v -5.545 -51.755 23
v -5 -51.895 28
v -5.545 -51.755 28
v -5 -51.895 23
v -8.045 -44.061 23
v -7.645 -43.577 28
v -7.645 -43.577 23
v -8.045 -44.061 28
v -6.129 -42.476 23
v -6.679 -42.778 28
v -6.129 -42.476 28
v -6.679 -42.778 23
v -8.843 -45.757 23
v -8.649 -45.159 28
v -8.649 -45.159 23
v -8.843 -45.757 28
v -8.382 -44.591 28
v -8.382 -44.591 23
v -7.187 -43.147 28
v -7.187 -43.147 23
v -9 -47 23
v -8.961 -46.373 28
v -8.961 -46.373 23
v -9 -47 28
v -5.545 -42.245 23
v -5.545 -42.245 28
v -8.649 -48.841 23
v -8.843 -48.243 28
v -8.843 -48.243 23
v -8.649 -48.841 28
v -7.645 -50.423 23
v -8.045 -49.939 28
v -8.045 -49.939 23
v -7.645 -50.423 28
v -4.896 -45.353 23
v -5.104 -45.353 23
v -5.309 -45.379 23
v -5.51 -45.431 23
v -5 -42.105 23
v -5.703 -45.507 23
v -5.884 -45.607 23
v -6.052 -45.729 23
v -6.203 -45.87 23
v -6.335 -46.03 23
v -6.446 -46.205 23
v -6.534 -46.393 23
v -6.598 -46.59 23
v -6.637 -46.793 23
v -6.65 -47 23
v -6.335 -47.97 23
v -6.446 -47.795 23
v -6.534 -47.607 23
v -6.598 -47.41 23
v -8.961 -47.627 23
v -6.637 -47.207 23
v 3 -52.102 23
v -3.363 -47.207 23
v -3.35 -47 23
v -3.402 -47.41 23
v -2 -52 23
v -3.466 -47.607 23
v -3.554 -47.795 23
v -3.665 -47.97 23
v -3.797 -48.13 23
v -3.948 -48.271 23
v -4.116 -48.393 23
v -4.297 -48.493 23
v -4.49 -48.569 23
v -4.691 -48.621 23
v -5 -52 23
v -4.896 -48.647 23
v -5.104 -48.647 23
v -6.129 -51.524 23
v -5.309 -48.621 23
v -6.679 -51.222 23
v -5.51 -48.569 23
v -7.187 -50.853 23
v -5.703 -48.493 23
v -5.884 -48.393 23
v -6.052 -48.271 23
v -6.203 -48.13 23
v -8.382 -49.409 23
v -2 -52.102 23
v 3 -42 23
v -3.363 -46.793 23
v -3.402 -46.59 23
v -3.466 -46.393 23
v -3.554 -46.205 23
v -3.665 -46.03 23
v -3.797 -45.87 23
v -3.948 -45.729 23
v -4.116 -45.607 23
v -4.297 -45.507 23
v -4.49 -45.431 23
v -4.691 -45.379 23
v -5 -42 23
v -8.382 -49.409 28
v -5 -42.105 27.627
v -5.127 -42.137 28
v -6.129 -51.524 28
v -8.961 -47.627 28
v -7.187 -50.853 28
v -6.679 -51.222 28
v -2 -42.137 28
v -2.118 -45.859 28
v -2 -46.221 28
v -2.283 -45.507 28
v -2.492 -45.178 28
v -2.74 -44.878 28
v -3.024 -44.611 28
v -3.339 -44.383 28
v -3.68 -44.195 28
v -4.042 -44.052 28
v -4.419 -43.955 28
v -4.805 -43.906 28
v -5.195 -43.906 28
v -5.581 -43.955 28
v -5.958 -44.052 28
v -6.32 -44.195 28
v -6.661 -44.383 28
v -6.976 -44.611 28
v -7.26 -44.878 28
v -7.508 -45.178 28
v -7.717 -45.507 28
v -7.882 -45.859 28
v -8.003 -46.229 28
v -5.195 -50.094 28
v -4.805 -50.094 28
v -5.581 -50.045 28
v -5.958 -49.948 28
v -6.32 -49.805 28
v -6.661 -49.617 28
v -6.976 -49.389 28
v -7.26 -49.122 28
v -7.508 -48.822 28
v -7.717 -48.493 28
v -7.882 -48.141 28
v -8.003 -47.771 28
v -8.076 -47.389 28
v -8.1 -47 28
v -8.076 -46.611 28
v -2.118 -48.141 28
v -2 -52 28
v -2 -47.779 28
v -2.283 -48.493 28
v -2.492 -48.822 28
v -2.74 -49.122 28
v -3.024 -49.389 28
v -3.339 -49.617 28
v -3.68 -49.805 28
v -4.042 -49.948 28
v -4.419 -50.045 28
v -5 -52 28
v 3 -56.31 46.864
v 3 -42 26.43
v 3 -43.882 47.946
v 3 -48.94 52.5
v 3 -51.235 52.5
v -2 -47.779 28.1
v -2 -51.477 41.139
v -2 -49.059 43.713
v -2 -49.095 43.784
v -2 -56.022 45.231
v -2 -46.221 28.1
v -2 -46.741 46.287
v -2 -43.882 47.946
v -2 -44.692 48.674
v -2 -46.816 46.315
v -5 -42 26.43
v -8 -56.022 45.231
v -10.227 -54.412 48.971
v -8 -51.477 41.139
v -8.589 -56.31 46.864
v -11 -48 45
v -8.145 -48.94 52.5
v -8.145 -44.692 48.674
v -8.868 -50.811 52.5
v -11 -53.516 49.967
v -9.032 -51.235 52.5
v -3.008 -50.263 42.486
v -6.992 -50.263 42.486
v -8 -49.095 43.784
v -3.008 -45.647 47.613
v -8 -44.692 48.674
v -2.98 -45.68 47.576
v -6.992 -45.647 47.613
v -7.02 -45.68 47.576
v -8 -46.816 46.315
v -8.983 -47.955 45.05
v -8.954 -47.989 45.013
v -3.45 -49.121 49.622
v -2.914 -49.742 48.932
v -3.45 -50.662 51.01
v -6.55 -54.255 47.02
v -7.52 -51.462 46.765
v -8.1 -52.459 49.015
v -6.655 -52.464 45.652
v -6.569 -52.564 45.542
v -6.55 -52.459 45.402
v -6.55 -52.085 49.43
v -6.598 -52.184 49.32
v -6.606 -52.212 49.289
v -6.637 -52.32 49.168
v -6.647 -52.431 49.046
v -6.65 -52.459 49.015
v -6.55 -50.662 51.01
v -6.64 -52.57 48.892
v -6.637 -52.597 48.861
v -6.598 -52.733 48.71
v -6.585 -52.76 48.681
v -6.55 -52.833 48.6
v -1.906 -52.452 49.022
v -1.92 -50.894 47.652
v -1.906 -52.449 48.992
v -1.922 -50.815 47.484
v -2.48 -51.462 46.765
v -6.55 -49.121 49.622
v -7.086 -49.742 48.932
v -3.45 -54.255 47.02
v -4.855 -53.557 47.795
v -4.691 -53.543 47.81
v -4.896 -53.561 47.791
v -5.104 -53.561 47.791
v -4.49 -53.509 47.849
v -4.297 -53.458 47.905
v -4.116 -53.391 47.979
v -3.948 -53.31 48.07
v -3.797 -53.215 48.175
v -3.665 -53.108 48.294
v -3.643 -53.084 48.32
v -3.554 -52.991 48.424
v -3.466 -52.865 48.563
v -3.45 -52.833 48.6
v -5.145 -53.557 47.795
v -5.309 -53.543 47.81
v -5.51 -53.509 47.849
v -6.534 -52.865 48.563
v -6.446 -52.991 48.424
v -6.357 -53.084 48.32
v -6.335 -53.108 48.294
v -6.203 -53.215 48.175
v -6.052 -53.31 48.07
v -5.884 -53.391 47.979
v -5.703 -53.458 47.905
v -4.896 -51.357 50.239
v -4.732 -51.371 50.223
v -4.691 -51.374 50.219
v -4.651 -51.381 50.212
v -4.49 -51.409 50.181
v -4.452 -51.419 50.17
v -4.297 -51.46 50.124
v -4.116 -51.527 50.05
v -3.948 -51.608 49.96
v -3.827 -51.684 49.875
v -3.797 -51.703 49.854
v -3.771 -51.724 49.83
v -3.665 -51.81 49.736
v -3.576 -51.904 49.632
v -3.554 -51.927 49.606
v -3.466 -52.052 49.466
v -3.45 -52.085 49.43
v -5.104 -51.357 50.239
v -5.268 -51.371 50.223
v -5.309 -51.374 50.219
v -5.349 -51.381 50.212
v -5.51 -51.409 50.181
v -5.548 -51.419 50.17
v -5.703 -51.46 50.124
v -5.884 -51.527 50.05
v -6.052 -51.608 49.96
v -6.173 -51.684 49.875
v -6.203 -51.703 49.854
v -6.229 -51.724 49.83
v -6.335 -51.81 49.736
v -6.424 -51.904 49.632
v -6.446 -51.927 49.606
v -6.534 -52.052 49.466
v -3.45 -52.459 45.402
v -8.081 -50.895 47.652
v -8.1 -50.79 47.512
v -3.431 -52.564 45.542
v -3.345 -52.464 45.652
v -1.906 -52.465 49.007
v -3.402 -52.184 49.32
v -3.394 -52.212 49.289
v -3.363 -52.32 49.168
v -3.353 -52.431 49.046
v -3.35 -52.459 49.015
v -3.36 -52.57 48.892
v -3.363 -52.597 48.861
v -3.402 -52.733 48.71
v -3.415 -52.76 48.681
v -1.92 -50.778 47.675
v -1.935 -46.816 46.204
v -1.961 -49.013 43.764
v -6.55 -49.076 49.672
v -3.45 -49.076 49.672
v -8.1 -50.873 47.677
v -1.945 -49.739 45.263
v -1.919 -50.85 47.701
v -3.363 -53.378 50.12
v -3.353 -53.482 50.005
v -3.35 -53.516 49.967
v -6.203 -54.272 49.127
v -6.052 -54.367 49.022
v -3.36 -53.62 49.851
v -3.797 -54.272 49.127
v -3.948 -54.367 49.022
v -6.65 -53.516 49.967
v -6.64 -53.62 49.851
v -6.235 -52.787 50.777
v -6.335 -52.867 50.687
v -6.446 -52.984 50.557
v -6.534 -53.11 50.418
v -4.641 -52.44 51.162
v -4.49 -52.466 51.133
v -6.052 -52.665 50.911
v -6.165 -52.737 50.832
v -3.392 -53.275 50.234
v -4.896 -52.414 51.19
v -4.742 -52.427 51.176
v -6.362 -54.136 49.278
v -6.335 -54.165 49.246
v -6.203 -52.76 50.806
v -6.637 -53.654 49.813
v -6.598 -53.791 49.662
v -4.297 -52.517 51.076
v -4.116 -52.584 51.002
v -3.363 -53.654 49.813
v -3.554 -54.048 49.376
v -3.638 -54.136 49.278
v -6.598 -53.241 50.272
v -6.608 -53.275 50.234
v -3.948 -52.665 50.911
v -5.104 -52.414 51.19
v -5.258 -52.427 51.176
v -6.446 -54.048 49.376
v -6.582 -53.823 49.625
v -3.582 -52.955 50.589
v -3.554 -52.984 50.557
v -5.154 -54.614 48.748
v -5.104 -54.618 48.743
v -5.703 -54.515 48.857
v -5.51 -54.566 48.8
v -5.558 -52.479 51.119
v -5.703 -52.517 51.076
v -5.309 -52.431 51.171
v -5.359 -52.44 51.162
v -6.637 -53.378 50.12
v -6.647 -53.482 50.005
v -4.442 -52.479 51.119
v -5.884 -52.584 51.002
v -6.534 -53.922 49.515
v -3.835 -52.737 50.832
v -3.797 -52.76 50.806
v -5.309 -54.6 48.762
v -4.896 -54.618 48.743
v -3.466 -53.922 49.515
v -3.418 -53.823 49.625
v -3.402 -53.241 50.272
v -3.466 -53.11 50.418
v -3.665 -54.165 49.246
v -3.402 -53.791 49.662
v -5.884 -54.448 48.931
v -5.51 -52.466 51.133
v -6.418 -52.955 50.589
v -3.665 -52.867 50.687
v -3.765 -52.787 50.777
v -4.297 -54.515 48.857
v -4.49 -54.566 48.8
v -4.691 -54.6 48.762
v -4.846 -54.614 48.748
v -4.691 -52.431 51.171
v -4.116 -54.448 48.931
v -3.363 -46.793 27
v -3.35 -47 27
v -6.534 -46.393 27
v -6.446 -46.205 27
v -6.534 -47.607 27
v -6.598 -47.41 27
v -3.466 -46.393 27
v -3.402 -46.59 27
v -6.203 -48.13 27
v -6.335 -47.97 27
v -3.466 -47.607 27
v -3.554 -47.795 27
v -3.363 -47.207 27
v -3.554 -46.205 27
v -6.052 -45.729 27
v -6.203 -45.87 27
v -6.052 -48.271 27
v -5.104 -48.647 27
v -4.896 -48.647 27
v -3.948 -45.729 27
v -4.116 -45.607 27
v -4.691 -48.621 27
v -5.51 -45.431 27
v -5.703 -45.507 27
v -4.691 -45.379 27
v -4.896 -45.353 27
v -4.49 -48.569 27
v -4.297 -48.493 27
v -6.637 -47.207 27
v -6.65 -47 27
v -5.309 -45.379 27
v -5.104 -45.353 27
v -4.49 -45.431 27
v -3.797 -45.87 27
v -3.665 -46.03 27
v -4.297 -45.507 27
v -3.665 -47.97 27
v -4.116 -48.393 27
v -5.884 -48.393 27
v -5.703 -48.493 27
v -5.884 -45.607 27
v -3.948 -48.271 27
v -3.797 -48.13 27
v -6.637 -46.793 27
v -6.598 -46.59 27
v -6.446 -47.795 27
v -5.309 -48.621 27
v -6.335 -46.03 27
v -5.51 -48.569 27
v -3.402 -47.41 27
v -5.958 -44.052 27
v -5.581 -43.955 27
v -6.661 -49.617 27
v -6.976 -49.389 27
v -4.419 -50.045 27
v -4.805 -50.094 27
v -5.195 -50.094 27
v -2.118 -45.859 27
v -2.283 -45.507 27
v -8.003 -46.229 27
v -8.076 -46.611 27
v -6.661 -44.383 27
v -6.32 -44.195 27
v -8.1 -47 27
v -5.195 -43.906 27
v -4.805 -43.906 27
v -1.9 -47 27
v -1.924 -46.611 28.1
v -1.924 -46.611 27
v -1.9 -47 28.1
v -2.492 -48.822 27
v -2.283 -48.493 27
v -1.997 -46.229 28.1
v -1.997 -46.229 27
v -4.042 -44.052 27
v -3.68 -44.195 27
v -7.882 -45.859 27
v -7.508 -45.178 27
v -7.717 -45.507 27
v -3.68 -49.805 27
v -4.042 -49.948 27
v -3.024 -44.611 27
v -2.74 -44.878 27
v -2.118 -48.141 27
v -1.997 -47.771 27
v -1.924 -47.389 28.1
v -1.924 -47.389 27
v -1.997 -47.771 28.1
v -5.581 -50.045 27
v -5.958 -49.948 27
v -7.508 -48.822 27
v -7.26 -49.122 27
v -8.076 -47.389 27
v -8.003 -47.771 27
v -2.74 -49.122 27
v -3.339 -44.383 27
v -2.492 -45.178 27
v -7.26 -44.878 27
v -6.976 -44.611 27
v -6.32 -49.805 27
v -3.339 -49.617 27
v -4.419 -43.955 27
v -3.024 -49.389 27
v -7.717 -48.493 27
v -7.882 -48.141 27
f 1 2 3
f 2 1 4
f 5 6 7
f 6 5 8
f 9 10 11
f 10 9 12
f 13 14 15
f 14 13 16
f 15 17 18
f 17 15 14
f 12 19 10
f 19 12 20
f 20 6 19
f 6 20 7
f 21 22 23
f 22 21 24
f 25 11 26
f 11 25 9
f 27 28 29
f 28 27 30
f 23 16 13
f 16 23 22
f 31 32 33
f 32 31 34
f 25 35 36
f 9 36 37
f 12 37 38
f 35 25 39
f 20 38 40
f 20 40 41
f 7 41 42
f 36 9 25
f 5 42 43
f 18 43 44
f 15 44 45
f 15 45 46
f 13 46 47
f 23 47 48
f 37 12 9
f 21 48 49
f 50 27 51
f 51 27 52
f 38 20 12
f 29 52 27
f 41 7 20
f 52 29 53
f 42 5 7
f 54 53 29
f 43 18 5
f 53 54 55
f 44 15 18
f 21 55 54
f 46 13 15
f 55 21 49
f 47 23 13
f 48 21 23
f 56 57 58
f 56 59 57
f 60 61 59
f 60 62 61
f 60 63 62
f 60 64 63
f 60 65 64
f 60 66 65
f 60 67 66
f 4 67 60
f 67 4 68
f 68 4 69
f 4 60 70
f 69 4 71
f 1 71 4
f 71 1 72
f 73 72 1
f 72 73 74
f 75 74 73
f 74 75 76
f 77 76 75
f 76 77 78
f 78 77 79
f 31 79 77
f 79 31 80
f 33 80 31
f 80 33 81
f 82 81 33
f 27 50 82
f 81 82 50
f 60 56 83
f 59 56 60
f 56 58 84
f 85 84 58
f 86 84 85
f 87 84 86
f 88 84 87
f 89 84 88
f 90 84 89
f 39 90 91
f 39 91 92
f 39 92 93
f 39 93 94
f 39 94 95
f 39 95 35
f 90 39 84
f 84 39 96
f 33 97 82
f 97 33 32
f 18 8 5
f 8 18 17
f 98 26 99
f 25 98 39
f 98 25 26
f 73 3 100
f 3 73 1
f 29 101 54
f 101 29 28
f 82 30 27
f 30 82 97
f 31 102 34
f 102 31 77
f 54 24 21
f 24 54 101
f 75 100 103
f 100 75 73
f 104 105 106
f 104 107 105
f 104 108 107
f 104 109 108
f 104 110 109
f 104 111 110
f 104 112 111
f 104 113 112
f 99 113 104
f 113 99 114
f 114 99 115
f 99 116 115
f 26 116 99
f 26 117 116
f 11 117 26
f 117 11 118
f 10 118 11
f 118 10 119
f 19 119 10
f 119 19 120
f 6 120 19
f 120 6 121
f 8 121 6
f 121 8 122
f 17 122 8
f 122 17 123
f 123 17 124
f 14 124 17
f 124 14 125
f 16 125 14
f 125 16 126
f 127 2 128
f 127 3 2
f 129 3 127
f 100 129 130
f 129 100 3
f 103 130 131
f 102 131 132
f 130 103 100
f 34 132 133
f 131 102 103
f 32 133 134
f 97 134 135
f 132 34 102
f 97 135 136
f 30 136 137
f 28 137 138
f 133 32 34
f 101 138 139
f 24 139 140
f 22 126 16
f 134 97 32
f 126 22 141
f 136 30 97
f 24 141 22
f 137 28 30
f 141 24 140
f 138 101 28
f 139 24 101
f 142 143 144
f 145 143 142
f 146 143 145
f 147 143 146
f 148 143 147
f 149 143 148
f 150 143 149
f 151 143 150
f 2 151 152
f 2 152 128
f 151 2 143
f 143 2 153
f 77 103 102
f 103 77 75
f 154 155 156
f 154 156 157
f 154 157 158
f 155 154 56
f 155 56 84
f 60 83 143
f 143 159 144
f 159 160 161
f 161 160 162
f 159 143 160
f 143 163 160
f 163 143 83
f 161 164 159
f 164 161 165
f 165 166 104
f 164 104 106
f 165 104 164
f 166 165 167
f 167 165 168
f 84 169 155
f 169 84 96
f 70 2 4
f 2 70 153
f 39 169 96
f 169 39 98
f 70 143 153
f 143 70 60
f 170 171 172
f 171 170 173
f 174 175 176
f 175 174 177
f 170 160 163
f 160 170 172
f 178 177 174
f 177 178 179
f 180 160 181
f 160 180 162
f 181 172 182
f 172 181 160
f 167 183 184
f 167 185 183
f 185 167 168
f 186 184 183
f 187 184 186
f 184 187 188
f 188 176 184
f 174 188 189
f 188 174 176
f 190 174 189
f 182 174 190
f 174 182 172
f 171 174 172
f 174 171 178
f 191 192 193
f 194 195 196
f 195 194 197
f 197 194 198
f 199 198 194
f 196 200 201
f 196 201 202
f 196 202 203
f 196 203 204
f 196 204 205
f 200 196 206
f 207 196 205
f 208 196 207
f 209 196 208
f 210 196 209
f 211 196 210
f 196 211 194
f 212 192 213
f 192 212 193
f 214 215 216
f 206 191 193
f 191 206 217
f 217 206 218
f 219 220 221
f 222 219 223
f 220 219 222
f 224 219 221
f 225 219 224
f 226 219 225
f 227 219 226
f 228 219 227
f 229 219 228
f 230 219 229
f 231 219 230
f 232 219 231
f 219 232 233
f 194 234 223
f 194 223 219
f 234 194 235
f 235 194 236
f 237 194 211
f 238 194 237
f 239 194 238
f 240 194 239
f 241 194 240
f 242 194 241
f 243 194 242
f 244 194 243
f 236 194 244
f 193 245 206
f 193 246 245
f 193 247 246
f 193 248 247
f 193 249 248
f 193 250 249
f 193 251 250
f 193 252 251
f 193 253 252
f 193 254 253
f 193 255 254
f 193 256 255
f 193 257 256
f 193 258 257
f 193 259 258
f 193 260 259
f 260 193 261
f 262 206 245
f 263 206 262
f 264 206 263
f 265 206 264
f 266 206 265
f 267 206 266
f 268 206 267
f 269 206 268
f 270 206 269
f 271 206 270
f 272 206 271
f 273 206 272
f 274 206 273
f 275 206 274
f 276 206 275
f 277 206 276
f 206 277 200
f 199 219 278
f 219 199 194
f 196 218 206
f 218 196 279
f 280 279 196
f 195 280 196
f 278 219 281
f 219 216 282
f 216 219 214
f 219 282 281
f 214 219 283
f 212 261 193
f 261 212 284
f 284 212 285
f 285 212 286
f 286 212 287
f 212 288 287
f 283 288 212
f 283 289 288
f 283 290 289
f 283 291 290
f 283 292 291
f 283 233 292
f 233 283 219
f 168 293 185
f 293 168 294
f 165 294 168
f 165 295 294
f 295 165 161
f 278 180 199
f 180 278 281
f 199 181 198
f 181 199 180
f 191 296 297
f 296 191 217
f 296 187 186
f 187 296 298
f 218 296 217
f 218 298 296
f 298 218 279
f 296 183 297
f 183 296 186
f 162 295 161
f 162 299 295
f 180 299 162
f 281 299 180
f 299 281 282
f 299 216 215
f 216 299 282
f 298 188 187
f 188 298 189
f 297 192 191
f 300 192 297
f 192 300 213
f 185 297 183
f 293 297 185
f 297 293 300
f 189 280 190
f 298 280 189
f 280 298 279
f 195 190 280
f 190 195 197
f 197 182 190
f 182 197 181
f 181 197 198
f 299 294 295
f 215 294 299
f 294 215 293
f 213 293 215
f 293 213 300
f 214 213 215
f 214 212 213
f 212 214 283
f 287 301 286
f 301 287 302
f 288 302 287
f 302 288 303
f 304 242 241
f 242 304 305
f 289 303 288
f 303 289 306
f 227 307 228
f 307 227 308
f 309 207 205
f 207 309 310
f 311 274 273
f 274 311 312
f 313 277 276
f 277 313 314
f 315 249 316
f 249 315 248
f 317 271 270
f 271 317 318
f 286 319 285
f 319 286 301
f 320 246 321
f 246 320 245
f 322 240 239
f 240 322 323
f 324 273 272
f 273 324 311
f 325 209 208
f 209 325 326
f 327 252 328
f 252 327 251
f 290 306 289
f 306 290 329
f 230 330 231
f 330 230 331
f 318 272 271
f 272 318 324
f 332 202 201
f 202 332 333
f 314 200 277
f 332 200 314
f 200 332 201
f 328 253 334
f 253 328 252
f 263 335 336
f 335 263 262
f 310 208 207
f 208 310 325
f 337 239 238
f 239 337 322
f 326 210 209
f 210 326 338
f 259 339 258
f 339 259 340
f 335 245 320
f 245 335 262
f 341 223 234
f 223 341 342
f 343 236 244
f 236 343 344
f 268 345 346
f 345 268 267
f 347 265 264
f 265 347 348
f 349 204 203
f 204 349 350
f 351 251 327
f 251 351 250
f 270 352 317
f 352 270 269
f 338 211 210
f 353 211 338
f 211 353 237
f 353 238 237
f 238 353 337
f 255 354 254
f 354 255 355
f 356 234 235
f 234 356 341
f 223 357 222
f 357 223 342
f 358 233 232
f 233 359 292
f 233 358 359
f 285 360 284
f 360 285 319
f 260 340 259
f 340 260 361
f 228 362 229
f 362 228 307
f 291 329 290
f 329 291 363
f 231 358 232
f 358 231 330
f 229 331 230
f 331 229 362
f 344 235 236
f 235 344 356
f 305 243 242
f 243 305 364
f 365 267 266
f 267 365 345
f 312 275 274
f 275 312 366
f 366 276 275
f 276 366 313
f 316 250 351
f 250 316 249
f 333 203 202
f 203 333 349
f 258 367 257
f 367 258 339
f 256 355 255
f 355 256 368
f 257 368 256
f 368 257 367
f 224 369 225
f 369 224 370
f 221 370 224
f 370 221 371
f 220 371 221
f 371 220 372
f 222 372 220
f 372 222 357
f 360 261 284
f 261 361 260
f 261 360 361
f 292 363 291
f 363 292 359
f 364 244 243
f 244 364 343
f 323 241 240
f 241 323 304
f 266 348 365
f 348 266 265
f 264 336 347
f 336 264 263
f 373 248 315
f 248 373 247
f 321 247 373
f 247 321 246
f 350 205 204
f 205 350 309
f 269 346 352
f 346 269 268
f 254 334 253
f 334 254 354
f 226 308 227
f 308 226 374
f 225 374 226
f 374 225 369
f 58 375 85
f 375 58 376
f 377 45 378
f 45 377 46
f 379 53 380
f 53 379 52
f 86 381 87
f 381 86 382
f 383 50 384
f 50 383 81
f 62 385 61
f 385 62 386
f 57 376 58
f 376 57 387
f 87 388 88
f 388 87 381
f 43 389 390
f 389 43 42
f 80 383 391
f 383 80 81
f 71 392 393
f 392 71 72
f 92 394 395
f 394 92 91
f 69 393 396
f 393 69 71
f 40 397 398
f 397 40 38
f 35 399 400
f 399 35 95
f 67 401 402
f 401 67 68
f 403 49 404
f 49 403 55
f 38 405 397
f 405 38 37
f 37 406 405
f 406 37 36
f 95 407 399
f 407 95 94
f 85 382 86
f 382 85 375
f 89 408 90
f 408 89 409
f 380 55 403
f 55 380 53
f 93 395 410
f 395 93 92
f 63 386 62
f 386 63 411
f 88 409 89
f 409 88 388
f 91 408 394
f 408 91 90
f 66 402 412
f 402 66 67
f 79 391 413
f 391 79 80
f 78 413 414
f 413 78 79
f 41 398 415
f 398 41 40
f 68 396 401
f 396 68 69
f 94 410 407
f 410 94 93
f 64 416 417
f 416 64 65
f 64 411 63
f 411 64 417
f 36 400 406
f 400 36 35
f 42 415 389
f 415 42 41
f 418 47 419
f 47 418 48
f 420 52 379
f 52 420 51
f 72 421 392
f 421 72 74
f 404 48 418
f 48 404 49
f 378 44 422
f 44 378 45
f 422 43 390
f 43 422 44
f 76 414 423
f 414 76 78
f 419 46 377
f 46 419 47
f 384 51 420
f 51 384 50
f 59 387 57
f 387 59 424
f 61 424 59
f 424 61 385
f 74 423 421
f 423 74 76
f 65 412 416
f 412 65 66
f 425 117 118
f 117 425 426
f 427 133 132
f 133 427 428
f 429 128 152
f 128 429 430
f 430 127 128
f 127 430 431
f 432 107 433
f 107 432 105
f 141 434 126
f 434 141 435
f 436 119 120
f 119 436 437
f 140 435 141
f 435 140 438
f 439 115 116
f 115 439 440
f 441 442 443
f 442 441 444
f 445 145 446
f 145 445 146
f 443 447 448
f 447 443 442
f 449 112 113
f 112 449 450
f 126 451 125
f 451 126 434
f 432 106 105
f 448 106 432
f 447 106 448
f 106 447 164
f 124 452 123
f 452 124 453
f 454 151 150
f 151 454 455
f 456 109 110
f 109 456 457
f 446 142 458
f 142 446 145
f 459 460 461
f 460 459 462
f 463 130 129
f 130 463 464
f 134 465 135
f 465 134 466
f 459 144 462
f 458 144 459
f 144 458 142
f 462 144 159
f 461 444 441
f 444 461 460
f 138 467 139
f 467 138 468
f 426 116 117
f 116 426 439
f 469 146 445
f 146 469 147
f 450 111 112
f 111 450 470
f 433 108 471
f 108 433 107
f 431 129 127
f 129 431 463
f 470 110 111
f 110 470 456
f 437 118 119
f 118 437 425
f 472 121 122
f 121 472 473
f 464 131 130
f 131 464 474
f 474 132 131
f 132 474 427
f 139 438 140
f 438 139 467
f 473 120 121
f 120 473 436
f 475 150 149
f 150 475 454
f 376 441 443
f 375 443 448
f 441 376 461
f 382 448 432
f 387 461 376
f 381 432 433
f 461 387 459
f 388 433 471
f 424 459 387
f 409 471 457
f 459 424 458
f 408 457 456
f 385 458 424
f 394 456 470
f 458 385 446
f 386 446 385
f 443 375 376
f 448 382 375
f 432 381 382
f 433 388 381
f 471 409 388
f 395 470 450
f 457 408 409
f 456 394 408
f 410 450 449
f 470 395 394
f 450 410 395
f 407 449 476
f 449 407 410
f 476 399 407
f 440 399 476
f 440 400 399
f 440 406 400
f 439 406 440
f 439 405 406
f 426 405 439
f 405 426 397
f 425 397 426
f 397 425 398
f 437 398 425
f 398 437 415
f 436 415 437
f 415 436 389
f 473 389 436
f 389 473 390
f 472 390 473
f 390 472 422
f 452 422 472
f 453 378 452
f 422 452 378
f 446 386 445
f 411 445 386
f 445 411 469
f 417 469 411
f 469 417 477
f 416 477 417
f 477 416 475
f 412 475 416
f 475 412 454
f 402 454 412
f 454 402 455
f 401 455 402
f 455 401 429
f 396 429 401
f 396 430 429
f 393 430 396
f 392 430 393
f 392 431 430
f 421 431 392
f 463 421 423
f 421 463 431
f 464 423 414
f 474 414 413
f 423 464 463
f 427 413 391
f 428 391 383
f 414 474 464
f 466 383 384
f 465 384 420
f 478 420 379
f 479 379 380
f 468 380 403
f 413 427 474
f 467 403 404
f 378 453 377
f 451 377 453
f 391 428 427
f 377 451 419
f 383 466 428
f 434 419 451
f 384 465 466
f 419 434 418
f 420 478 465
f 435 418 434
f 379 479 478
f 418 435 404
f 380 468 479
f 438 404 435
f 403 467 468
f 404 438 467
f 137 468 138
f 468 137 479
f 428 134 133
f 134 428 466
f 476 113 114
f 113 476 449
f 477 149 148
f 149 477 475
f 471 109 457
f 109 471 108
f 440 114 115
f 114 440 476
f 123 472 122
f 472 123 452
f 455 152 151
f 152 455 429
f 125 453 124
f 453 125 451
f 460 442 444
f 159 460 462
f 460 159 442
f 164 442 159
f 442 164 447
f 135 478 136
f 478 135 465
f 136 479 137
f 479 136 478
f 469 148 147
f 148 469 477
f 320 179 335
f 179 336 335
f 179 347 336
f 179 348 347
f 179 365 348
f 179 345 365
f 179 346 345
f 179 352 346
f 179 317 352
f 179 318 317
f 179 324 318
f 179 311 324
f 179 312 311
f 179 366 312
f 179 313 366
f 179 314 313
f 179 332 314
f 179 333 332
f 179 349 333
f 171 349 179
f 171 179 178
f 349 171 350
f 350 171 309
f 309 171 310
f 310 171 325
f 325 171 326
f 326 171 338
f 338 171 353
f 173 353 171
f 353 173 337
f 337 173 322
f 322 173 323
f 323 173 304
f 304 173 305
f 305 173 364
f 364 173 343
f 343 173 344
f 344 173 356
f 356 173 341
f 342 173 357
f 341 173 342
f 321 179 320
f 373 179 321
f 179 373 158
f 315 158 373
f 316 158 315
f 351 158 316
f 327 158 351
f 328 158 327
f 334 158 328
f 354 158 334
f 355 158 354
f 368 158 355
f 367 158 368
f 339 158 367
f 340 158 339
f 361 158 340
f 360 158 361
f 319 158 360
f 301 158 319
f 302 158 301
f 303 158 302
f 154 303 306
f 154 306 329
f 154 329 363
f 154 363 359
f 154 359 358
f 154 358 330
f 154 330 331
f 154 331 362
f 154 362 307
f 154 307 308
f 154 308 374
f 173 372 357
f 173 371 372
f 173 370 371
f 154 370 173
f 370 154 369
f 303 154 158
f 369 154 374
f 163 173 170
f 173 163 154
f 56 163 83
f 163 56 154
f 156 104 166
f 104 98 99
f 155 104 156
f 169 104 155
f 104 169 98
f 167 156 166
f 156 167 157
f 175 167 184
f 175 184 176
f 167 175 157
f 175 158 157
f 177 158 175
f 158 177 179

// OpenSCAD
// PRUSA iteration4
// Print fan support
// GNU GPL v3
// Josef Průša <iam@josefprusa.cz> and contributors
// http://www.reprap.org/wiki/Prusa_Mendel
// http://prusamendel.org



difference()
{
    union()
{
        translate([-4,-47,23]) rotate([0,0,0])cylinder(h = 5, r=5, $fn=50);
        translate([-2,-57,23]) rotate([0,0,0]) cube([5,15,30]);
        translate([-5,-52,23]) rotate([0,0,0]) cube([8,10,5]);
        translate([-5,-48,45]) rotate([48,0,0])cylinder(h = 10, r=6, $fn=6);
}

        translate([-5,-48,45]) rotate([48,0,0])cylinder(h = 30, r=1.65, $fn=50);
        
        
        difference()
        {
            union()
            {
                translate([-5,-48,45]) rotate([48,0,0])cylinder(h = 6, r=3.1, $fn=6);
                translate([-5,-47.9,45]) rotate([48,0,0])cylinder(h = 4, r2=3.1,r1=4, $fn=6);
            }
            translate([-2,-55,40]) rotate([0,0.6,0]) cube([10,10,10]);
        }
        translate([-5,-47,10]) rotate([0,0,0])cylinder(h = 25, r=1.65, $fn=50);
        translate([-5,-47,27]) rotate([0,0,0])cylinder(h = 1.1, r=3.1, $fn=50);
        
        translate([10,-85,15]) rotate([0,-48,90]) cube([60,50,20]);
        translate([-15,-71,15]) rotate([10,0,0]) cube([50,20,40]);
        translate([-15,-41,15]) rotate([5,0,0]) cube([50,20,40]);
        translate([-15,-39.5,44]) rotate([48,0,0]) cube([20,20,20]);
        translate([-15,-60,52.5]) rotate([0,0,0]) cube([20,20,20]);
}
